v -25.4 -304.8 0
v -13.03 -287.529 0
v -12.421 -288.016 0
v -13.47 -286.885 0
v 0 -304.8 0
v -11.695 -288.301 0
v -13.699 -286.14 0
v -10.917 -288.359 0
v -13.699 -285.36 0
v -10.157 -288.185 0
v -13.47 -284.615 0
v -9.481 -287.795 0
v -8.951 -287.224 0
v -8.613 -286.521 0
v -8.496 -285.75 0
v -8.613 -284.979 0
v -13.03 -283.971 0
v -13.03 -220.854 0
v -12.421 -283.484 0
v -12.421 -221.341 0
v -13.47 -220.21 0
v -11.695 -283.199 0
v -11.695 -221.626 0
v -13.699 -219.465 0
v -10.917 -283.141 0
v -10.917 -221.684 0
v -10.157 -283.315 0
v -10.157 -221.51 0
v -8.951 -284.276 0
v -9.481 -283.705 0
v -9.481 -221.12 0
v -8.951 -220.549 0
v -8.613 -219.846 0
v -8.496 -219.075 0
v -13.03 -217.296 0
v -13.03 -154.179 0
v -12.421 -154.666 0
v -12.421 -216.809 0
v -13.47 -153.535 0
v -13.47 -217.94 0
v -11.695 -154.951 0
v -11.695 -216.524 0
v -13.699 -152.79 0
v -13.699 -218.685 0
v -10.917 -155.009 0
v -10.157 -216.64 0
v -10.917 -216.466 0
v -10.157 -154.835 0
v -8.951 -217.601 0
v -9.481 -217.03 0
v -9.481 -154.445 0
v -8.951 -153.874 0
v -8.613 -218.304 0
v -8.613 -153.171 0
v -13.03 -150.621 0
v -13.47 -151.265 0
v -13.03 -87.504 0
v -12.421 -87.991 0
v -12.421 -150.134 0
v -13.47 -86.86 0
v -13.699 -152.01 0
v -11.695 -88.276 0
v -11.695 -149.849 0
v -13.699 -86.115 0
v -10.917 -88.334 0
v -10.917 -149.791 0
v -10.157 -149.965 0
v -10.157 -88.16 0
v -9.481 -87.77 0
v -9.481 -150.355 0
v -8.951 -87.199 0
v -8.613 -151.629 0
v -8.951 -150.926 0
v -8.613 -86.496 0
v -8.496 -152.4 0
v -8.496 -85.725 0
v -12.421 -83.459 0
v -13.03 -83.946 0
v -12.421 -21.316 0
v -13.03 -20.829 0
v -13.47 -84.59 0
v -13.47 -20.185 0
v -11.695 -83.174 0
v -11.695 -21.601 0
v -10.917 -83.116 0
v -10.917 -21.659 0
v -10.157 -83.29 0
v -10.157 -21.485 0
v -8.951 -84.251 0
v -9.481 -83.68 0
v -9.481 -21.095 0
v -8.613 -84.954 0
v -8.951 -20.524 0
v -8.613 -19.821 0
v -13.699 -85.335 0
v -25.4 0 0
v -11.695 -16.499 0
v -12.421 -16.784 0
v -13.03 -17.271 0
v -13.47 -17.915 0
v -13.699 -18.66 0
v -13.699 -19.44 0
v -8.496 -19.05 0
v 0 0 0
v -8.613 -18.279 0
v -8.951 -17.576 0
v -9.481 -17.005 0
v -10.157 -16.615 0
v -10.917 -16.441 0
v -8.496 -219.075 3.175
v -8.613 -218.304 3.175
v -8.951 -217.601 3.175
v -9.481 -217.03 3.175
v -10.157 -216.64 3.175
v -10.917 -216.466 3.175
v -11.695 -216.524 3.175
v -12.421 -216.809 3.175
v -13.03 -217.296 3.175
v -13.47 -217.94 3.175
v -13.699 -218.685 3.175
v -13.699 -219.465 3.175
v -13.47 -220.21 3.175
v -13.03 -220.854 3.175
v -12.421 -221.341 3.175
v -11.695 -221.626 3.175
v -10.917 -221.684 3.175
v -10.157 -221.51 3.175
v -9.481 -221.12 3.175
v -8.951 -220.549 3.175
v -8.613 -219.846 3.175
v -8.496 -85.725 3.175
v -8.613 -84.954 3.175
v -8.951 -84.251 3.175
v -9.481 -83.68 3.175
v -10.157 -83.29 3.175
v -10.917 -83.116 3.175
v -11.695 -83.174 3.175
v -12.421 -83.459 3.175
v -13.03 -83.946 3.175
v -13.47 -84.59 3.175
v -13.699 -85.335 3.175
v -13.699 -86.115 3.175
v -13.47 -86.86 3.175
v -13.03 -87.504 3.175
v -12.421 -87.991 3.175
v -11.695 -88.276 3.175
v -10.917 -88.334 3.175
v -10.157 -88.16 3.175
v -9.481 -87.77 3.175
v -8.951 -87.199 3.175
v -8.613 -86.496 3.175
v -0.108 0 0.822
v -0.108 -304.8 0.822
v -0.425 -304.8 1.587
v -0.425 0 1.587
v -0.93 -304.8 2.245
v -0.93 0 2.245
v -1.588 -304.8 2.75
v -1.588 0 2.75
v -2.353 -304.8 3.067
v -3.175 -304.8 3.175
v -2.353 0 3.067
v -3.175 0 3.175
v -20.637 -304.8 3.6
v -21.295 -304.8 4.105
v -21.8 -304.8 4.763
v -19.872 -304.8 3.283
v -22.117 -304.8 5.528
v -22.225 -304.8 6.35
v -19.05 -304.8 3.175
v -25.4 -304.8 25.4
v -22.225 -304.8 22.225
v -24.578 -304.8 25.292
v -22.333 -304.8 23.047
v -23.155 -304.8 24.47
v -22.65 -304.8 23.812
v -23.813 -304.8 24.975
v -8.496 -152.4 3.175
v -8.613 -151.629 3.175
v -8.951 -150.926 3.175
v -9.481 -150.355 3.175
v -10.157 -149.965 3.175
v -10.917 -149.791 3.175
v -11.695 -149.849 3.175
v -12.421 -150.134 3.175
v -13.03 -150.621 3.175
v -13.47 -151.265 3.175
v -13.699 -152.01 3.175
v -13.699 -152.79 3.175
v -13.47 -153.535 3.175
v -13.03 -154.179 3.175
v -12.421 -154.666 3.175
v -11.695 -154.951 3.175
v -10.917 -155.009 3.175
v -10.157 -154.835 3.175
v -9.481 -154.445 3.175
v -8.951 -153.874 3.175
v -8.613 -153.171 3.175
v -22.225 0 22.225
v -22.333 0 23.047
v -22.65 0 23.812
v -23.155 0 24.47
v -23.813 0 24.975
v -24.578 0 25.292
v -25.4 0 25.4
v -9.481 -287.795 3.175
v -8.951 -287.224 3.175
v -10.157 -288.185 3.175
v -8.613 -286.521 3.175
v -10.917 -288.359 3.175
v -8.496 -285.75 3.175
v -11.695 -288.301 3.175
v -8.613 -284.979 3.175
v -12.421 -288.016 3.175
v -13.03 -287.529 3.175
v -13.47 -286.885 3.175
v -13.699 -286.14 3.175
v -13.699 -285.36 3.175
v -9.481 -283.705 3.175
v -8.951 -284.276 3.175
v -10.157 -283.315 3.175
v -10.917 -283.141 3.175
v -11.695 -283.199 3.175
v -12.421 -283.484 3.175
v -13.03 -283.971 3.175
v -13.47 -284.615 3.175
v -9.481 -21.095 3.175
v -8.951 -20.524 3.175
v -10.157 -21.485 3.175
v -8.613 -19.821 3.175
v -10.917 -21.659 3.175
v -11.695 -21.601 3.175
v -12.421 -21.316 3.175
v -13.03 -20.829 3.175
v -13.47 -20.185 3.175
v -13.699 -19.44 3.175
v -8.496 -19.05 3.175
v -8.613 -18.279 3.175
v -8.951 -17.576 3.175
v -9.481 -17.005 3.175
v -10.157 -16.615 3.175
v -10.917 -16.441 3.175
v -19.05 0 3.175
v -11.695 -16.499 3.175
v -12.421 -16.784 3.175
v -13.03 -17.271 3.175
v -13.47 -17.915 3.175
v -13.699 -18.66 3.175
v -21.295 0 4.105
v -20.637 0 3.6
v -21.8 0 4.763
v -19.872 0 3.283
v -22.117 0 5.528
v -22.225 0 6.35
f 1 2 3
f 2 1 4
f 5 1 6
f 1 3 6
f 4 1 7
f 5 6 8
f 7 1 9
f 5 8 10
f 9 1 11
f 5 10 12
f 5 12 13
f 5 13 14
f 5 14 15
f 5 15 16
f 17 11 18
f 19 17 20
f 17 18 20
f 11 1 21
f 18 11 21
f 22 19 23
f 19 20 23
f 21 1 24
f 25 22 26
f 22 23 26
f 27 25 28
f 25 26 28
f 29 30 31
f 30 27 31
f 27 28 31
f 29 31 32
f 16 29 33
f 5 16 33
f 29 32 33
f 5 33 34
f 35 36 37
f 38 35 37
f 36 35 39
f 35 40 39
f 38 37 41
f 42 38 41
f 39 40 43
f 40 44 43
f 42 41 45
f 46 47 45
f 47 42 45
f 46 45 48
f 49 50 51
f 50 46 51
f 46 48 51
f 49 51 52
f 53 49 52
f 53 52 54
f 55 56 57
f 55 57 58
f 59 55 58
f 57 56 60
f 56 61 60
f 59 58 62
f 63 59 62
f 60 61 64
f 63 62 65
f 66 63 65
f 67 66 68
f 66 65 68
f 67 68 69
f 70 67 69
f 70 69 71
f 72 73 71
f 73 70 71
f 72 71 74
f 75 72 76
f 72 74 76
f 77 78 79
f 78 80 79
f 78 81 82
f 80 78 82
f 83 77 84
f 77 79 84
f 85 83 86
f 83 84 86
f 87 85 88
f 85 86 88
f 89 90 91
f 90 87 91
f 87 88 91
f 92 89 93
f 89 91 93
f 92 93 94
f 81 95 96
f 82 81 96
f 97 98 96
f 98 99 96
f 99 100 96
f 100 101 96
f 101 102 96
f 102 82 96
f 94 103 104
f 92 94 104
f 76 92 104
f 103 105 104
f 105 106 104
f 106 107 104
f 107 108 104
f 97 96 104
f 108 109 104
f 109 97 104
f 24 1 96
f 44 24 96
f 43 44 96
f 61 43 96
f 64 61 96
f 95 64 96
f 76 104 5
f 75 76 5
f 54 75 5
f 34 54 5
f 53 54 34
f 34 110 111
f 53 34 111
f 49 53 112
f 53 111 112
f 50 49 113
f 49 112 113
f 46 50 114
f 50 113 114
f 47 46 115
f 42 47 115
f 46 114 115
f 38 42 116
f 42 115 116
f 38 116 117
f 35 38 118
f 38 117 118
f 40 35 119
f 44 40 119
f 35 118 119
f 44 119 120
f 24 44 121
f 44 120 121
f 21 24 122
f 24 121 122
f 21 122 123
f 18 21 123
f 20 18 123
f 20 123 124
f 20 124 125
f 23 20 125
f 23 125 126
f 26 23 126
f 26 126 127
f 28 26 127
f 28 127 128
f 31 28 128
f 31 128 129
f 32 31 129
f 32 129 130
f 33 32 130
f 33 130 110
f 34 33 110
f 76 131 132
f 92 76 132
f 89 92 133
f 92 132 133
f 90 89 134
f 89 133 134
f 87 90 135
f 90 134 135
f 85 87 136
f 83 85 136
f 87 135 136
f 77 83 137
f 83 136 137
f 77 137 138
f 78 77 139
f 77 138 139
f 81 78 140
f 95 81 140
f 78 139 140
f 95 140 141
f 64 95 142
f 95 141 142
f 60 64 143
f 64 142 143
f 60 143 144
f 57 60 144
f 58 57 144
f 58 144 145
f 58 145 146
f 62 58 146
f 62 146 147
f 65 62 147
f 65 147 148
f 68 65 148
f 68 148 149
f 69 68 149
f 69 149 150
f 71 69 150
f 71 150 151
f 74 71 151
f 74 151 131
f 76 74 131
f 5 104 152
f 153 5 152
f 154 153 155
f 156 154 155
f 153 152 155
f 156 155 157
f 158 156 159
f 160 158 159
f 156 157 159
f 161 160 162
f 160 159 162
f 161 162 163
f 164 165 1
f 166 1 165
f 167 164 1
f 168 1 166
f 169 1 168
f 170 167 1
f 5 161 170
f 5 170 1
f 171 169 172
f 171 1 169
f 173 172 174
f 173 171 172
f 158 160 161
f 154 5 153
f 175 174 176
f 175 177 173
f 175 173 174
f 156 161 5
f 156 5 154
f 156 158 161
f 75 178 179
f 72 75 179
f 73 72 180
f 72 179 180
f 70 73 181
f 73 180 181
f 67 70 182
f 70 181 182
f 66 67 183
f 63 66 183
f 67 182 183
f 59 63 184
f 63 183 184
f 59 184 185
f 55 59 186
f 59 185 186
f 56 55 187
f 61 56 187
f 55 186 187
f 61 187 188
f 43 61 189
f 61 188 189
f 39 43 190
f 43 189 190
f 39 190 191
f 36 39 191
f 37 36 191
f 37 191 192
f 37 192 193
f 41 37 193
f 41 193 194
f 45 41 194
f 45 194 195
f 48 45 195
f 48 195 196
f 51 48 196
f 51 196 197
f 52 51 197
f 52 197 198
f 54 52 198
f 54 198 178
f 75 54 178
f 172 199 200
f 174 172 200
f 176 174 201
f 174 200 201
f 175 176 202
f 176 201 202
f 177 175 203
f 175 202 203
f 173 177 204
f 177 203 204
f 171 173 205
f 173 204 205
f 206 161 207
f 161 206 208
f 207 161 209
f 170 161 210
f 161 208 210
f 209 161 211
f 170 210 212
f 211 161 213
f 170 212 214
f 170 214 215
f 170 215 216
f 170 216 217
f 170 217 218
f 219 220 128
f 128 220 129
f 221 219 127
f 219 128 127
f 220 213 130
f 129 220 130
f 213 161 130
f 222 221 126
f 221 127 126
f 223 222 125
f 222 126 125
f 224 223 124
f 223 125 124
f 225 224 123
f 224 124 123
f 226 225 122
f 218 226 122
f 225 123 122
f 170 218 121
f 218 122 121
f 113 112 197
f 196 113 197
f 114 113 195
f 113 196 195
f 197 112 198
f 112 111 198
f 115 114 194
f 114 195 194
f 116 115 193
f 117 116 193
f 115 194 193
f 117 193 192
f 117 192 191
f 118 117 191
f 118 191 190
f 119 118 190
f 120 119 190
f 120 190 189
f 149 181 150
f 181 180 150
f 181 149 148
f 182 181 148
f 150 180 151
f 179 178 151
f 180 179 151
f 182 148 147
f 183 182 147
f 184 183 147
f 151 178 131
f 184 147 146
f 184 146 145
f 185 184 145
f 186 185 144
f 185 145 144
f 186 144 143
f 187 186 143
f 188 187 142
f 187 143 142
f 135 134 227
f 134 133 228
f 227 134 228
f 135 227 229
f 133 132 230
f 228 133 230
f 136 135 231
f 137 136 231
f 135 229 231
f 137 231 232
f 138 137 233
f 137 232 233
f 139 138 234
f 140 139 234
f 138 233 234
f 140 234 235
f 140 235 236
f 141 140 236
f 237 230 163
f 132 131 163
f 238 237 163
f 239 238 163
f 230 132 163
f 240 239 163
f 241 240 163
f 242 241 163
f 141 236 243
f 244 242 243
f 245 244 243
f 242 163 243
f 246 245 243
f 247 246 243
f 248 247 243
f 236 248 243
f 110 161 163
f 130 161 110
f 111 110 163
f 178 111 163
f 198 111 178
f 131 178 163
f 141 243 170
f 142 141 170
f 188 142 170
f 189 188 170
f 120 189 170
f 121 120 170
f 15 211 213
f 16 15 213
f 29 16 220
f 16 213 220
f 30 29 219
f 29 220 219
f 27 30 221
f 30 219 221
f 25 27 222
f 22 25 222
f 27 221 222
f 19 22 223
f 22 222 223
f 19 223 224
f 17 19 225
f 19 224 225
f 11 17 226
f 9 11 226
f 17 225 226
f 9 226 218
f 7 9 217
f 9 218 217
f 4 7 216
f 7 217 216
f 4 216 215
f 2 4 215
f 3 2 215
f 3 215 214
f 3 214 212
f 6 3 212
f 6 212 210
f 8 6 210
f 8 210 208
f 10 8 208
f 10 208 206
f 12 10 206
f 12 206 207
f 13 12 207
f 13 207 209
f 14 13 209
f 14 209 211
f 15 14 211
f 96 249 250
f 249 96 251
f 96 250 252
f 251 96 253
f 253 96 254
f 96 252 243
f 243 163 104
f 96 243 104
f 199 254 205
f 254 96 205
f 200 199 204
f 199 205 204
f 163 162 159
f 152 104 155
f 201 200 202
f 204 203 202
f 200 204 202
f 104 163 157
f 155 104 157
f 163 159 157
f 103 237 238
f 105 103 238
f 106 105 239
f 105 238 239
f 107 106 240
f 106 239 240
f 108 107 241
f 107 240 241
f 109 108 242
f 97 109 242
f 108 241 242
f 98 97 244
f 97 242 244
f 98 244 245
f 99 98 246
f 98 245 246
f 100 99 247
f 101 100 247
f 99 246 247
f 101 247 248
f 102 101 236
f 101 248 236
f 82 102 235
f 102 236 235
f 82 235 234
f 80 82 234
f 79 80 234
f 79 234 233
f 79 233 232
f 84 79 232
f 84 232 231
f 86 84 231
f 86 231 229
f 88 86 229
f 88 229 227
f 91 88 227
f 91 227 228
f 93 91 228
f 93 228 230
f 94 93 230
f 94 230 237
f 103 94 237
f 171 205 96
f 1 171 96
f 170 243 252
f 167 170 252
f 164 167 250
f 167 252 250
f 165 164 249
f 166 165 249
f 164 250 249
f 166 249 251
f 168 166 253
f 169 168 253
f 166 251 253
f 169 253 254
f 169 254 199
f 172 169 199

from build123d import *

# Parameters (mm, degrees)
F1_DEPTH = 304.8
F2_R     = 2.6162
F3_DEPTH = 3.176


with BuildPart() as f1:
    # F0 (on Front) → F1 (new body)
    with BuildSketch(Plane.XZ):
        with BuildLine():
            Line((-25.4, 0), (0, 0))
            ThreePointArc((0, 0), (-0.929936, 2.245064), (-3.175, 3.175))
            Line((-3.175, 3.175), (-19.05, 3.175))
            ThreePointArc((-19.05, 3.175), (-21.295064, 4.104936), (-22.225, 6.35))
            Line((-22.225, 6.35), (-22.225, 22.225))
            ThreePointArc((-22.225, 22.225), (-23.154936, 24.470064), (-25.4, 25.4))
            Line((-25.4, 25.4), (-25.4, 0))
        make_face()
    extrude(amount=F1_DEPTH)

    # F2 (on face) → F3 (cut, through all)
    with BuildSketch(Plane.XY.offset(3.175)):
        with Locations((-11.1125, -285.75)):
            Circle(F2_R)
        with Locations((-11.1125, -19.05)):
            Circle(F2_R)
        with Locations((-11.1125, -219.075)):
            Circle(F2_R)
        with Locations((-11.1125, -152.4)):
            Circle(F2_R)
        with Locations((-11.1125, -85.725)):
            Circle(F2_R)
    extrude(amount=-F3_DEPTH, mode=Mode.SUBTRACT)


solid = f1.part
